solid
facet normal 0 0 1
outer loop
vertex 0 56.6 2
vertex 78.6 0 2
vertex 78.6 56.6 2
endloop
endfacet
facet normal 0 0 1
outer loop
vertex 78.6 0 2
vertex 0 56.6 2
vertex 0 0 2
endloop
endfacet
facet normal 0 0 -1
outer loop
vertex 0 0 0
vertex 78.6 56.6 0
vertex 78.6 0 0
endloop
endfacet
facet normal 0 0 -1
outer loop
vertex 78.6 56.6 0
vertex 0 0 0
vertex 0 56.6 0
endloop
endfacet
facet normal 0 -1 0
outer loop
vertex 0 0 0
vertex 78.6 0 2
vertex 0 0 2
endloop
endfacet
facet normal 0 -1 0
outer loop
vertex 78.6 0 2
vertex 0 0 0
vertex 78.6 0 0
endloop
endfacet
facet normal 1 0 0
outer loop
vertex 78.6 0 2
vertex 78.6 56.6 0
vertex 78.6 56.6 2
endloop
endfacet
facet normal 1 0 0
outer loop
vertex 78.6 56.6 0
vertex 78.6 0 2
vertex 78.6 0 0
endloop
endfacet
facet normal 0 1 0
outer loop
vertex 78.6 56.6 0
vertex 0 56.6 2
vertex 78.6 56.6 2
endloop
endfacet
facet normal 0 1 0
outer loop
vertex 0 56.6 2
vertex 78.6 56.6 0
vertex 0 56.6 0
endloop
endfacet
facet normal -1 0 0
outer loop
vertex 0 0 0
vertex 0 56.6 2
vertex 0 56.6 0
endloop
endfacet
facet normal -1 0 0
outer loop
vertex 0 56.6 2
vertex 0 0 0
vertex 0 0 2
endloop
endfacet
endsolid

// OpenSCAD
pcb_w = 78;
pcb_l = 56;
speling = 0.3;
binnenmaat = [pcb_w + 2*speling, pcb_l + 2*speling];
cube([binnenmaat[0], binnenmaat[1], 2]);
